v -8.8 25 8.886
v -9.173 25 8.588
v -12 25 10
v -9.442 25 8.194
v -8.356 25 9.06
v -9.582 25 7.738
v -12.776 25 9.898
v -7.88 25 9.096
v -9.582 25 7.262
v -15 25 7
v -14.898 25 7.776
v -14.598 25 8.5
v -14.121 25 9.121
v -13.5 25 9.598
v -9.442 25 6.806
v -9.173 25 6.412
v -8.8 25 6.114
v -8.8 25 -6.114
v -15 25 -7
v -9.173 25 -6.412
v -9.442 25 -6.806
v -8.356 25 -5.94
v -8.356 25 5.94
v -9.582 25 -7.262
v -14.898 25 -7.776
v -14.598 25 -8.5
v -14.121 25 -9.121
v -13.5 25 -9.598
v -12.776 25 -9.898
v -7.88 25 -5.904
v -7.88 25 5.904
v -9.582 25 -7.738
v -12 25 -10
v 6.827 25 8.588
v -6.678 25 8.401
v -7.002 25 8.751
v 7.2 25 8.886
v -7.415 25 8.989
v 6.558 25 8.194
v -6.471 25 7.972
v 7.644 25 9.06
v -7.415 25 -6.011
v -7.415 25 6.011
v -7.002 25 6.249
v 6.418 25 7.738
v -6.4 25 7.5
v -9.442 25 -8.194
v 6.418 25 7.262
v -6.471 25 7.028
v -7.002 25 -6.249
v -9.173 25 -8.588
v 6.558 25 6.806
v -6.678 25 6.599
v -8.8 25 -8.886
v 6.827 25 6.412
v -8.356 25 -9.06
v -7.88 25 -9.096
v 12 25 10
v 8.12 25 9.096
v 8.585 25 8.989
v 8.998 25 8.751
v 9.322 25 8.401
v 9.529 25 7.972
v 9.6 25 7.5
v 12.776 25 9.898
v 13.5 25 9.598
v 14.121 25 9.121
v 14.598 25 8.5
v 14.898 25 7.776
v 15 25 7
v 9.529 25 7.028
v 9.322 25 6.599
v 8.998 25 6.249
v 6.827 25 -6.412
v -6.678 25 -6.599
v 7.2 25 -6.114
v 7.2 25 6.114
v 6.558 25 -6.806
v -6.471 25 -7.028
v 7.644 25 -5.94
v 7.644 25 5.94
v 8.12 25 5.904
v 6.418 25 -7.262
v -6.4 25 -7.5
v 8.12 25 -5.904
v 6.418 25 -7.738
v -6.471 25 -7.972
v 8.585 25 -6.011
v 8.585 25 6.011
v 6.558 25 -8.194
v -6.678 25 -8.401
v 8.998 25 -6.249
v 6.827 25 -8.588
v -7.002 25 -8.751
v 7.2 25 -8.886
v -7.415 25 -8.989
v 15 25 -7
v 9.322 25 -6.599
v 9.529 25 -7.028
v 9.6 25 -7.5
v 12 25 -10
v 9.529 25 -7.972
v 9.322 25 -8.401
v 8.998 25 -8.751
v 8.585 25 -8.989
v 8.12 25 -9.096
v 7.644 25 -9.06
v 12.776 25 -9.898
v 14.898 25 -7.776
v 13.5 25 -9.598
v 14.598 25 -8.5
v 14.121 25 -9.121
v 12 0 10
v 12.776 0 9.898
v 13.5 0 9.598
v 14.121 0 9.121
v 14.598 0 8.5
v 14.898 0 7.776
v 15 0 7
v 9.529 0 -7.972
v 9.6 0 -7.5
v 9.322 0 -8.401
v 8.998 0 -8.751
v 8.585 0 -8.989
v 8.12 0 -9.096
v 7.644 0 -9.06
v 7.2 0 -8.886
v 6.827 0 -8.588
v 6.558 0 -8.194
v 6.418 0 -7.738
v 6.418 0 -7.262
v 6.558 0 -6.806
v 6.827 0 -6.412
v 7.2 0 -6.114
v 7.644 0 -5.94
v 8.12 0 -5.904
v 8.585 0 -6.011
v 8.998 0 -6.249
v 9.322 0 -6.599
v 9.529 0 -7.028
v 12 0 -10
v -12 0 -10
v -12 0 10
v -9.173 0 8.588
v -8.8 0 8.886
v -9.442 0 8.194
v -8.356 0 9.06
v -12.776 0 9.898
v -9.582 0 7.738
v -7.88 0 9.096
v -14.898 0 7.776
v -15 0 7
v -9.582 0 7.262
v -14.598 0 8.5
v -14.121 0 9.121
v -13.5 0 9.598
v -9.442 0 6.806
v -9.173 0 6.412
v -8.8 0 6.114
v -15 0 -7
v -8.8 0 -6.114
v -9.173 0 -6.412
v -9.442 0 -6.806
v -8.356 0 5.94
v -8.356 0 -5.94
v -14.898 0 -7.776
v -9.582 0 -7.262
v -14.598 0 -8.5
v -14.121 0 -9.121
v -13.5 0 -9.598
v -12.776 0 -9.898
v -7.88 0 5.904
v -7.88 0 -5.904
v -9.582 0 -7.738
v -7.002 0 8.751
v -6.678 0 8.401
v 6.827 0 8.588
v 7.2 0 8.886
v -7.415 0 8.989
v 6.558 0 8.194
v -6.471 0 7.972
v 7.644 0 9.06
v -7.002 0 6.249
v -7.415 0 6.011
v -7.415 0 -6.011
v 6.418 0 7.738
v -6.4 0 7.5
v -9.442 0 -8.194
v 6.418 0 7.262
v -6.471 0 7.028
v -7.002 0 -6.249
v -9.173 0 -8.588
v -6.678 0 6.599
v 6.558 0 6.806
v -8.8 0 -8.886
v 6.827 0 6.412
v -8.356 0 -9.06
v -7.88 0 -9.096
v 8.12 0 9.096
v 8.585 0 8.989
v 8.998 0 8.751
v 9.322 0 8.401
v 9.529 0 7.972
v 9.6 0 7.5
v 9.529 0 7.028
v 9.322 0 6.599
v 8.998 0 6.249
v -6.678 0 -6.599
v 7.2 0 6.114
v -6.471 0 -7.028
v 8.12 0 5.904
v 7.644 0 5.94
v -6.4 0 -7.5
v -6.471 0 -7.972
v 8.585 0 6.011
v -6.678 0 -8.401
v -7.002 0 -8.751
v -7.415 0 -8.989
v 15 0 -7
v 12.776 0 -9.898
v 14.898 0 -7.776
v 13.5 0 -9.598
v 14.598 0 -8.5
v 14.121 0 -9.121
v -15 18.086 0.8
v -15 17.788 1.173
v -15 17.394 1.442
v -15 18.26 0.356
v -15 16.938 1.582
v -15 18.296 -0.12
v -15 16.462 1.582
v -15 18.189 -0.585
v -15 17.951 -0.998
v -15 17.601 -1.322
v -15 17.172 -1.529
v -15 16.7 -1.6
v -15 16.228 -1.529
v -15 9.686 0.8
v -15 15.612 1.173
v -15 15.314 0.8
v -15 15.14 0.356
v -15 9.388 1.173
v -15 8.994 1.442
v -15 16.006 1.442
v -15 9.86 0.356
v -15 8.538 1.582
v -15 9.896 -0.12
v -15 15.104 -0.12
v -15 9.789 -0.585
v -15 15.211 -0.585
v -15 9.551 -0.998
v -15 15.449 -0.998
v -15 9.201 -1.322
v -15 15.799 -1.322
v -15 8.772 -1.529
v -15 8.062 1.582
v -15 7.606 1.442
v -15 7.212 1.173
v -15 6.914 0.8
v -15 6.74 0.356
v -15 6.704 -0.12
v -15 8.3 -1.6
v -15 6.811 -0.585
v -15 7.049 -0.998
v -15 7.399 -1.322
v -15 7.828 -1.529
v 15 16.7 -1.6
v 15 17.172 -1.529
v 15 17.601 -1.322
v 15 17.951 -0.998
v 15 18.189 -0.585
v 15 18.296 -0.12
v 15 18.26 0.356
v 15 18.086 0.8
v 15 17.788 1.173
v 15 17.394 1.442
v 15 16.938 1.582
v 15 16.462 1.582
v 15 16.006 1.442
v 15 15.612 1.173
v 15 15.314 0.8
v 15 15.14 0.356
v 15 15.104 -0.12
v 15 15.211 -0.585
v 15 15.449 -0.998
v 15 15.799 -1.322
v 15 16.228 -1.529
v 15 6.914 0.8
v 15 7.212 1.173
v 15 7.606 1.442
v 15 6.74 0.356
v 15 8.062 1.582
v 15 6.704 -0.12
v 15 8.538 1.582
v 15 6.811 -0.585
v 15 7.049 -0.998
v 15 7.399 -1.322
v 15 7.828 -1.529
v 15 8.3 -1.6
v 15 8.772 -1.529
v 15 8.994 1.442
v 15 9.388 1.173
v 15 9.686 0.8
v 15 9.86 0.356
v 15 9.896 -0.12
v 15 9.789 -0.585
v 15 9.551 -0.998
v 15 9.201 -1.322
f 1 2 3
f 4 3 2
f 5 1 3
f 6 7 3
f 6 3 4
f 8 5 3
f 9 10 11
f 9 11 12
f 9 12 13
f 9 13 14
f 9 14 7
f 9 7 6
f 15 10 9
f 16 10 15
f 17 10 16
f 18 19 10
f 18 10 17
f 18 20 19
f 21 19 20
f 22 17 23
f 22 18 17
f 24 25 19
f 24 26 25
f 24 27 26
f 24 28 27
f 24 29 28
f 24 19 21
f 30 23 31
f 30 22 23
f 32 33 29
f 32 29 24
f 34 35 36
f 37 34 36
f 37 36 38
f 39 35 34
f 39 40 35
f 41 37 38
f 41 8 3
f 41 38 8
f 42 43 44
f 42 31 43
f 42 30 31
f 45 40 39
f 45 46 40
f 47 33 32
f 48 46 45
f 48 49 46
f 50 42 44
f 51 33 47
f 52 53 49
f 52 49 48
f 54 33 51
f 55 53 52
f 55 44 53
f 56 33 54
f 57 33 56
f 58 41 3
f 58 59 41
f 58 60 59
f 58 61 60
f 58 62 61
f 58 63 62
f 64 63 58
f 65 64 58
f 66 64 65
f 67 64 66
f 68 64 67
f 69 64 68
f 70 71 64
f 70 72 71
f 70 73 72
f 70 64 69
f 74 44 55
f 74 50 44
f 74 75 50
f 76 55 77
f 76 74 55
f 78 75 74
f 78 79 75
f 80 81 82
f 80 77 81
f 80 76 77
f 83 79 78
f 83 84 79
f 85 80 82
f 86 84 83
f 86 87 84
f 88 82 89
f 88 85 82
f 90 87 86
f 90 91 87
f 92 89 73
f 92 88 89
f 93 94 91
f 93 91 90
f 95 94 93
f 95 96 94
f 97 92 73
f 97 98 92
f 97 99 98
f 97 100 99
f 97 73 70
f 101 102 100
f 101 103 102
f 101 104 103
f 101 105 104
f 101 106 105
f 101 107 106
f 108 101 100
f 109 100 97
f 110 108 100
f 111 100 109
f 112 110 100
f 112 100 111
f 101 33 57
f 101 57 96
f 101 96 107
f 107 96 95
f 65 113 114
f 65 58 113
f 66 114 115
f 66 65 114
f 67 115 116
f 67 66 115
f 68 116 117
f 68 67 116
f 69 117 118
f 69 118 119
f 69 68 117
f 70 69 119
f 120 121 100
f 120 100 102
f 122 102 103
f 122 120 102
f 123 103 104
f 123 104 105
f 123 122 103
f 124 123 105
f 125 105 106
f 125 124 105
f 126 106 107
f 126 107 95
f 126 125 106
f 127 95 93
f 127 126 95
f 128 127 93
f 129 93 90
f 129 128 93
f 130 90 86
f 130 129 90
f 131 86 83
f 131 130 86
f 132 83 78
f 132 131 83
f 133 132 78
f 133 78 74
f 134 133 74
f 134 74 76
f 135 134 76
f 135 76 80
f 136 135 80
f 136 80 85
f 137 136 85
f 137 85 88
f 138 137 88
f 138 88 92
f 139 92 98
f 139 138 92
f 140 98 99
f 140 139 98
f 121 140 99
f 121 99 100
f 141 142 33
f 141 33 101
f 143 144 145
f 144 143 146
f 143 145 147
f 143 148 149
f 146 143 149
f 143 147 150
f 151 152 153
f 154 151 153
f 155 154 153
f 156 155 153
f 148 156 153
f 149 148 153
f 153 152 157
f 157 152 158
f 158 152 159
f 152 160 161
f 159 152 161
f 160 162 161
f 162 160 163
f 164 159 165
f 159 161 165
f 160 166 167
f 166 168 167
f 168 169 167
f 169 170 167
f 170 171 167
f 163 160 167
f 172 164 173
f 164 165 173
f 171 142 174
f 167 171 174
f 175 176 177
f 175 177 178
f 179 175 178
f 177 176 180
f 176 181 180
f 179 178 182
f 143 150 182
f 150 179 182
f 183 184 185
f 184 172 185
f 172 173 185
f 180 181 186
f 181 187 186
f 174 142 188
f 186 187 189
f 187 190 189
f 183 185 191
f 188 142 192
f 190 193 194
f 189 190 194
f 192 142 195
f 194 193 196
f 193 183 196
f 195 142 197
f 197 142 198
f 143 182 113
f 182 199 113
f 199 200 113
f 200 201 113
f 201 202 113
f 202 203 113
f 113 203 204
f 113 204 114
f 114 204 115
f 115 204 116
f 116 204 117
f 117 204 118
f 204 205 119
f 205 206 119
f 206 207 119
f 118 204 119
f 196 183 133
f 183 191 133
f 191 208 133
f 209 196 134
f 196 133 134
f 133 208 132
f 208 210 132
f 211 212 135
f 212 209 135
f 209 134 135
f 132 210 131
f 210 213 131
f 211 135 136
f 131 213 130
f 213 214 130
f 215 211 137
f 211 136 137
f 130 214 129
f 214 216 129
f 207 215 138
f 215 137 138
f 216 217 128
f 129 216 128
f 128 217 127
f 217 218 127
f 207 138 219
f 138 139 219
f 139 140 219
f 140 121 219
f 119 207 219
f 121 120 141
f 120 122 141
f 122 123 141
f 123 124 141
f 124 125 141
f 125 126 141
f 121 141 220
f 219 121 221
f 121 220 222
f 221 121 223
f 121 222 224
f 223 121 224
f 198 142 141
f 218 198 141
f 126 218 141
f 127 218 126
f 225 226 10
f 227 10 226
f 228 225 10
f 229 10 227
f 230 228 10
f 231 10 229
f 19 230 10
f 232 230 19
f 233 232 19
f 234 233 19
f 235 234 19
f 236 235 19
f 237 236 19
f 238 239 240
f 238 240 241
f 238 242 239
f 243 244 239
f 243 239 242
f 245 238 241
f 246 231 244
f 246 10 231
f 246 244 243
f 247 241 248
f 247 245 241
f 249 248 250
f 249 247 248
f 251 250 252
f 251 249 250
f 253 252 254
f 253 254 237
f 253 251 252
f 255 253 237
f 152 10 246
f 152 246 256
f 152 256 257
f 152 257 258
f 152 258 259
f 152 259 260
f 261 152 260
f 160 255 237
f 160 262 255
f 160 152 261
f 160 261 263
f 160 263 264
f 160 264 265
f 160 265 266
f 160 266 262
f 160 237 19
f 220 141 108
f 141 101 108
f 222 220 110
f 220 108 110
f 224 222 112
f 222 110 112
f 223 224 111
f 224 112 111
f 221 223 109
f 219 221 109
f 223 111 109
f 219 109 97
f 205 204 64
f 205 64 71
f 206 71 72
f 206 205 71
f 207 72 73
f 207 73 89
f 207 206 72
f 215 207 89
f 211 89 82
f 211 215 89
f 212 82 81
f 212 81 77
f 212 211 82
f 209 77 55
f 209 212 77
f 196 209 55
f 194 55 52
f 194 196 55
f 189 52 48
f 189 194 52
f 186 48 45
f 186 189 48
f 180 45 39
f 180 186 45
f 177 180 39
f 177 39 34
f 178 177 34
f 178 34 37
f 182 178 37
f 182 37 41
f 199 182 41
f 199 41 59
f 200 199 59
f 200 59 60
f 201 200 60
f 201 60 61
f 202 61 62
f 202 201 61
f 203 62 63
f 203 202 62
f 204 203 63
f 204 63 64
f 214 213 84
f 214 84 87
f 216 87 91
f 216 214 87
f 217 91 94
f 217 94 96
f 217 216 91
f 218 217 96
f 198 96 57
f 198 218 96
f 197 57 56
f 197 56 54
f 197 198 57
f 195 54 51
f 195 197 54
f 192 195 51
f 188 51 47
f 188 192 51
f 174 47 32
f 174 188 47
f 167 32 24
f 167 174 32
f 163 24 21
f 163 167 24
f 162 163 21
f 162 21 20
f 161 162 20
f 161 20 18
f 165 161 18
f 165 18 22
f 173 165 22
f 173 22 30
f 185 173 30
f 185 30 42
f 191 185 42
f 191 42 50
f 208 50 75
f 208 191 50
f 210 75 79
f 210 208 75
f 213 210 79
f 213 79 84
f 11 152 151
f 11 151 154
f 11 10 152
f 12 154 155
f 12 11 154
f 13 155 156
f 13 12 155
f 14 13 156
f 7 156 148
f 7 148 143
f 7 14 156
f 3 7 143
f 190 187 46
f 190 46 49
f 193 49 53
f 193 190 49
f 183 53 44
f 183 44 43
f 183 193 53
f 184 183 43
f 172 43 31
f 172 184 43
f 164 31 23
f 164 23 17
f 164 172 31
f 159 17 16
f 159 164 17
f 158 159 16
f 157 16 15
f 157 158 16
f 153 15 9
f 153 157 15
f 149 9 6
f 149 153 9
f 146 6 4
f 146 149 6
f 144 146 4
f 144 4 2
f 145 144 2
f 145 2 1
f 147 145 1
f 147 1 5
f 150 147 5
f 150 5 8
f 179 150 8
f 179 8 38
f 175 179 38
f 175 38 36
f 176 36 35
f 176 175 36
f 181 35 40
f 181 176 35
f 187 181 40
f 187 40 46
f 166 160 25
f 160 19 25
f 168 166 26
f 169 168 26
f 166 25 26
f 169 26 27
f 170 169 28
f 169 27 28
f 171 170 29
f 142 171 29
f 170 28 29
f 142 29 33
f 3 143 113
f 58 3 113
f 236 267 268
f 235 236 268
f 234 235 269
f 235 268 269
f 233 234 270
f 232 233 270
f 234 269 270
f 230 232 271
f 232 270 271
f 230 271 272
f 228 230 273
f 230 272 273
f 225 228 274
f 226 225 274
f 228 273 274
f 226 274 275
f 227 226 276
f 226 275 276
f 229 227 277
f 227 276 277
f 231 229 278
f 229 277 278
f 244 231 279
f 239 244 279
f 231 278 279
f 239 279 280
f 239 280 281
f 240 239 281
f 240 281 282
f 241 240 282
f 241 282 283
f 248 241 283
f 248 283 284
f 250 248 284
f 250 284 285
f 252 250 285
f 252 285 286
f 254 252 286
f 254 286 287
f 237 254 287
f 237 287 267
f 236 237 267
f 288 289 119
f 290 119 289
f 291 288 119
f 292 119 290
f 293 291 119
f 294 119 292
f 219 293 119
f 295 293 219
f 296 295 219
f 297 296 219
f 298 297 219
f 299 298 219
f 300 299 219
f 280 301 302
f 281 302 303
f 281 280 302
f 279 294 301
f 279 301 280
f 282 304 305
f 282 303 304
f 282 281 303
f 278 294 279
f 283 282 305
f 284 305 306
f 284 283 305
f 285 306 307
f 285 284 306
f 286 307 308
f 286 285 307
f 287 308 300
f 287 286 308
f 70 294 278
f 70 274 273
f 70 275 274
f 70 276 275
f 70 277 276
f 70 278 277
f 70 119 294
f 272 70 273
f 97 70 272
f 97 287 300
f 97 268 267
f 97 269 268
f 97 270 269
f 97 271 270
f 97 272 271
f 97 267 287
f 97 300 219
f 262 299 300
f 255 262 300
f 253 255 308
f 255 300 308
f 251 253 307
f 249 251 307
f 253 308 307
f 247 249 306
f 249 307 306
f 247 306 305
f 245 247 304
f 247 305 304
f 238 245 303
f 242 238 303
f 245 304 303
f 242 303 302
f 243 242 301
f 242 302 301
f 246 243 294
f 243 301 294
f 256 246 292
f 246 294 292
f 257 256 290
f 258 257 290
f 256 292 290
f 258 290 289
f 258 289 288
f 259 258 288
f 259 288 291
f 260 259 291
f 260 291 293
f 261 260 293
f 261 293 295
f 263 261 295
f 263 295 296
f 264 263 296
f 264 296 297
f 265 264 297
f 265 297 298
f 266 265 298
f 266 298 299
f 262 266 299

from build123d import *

# Parameters (mm, degrees)
SKETCH_1_W          = 30
SKETCH_1_H          = 20
SKETCH_1_R          = 1.6
EXTRUDE_1_DEPTH     = 25
FILLET_1_R          = 3
SKETCH_2_R          = 1.6
CUT_EXTRUDE_1_DEPTH = 31
SKETCH_3_R          = 1.6
EXTRUDE_2_DEPTH     = 30
SKETCH_4_R          = 1.6
CUT_EXTRUDE_2_DEPTH = 31


with BuildPart() as part:
    # 草图1 → 凸台-拉伸1 (new body)
    with BuildSketch(Plane(origin=(0, 0, 0), x_dir=(1, 0, 0), z_dir=(0, 1, 0))):
        Rectangle(SKETCH_1_W, SKETCH_1_H)
        with Locations((-8, 7.5)):
            Circle(SKETCH_1_R, mode=Mode.SUBTRACT)
        with Locations((-8, -7.5)):
            Circle(SKETCH_1_R, mode=Mode.SUBTRACT)
        with Locations((8, -7.5)):
            Circle(SKETCH_1_R, mode=Mode.SUBTRACT)
        with Locations((8, 7.5)):
            Circle(SKETCH_1_R, mode=Mode.SUBTRACT)
    extrude(amount=EXTRUDE_1_DEPTH)

    # 圆角1
    fillet_1_edges = [part.edges().sort_by_distance(p)[0] for p in [
        (15, 12.5, 10),
        (-15, 12.5, 10),
        (-15, 12.5, -10),
        (15, 12.5, -10),
    ]]
    fillet(fillet_1_edges, radius=FILLET_1_R)

    # 草图2 → 切除-拉伸1 (cut, through all)
    with BuildSketch(Plane(origin=(15, 0, 0), x_dir=(0, 0, -1), z_dir=(1, 0, 0))):
        with Locations((0, 16.7)):
            Circle(SKETCH_2_R)
        with Locations((0, 8.3)):
            Circle(SKETCH_2_R)
    extrude(amount=-CUT_EXTRUDE_1_DEPTH, mode=Mode.SUBTRACT)

    # 草图3 → 凸台-拉伸2 (add)
    with BuildSketch(Plane(origin=(15, 0, 0), x_dir=(0, 0, -1), z_dir=(1, 0, 0))):
        with Locations((0, 16.7)):
            Circle(SKETCH_3_R)
    extrude(amount=-EXTRUDE_2_DEPTH)

    # 草图4 → 切除-拉伸2 (cut, through all)
    with BuildSketch(Plane(origin=(15, 0, 0), x_dir=(0, 0, -1), z_dir=(1, 0, 0))):
        with Locations((0, 16.7)):
            Circle(SKETCH_4_R)
    extrude(amount=-CUT_EXTRUDE_2_DEPTH, mode=Mode.SUBTRACT)


solid = part.part
